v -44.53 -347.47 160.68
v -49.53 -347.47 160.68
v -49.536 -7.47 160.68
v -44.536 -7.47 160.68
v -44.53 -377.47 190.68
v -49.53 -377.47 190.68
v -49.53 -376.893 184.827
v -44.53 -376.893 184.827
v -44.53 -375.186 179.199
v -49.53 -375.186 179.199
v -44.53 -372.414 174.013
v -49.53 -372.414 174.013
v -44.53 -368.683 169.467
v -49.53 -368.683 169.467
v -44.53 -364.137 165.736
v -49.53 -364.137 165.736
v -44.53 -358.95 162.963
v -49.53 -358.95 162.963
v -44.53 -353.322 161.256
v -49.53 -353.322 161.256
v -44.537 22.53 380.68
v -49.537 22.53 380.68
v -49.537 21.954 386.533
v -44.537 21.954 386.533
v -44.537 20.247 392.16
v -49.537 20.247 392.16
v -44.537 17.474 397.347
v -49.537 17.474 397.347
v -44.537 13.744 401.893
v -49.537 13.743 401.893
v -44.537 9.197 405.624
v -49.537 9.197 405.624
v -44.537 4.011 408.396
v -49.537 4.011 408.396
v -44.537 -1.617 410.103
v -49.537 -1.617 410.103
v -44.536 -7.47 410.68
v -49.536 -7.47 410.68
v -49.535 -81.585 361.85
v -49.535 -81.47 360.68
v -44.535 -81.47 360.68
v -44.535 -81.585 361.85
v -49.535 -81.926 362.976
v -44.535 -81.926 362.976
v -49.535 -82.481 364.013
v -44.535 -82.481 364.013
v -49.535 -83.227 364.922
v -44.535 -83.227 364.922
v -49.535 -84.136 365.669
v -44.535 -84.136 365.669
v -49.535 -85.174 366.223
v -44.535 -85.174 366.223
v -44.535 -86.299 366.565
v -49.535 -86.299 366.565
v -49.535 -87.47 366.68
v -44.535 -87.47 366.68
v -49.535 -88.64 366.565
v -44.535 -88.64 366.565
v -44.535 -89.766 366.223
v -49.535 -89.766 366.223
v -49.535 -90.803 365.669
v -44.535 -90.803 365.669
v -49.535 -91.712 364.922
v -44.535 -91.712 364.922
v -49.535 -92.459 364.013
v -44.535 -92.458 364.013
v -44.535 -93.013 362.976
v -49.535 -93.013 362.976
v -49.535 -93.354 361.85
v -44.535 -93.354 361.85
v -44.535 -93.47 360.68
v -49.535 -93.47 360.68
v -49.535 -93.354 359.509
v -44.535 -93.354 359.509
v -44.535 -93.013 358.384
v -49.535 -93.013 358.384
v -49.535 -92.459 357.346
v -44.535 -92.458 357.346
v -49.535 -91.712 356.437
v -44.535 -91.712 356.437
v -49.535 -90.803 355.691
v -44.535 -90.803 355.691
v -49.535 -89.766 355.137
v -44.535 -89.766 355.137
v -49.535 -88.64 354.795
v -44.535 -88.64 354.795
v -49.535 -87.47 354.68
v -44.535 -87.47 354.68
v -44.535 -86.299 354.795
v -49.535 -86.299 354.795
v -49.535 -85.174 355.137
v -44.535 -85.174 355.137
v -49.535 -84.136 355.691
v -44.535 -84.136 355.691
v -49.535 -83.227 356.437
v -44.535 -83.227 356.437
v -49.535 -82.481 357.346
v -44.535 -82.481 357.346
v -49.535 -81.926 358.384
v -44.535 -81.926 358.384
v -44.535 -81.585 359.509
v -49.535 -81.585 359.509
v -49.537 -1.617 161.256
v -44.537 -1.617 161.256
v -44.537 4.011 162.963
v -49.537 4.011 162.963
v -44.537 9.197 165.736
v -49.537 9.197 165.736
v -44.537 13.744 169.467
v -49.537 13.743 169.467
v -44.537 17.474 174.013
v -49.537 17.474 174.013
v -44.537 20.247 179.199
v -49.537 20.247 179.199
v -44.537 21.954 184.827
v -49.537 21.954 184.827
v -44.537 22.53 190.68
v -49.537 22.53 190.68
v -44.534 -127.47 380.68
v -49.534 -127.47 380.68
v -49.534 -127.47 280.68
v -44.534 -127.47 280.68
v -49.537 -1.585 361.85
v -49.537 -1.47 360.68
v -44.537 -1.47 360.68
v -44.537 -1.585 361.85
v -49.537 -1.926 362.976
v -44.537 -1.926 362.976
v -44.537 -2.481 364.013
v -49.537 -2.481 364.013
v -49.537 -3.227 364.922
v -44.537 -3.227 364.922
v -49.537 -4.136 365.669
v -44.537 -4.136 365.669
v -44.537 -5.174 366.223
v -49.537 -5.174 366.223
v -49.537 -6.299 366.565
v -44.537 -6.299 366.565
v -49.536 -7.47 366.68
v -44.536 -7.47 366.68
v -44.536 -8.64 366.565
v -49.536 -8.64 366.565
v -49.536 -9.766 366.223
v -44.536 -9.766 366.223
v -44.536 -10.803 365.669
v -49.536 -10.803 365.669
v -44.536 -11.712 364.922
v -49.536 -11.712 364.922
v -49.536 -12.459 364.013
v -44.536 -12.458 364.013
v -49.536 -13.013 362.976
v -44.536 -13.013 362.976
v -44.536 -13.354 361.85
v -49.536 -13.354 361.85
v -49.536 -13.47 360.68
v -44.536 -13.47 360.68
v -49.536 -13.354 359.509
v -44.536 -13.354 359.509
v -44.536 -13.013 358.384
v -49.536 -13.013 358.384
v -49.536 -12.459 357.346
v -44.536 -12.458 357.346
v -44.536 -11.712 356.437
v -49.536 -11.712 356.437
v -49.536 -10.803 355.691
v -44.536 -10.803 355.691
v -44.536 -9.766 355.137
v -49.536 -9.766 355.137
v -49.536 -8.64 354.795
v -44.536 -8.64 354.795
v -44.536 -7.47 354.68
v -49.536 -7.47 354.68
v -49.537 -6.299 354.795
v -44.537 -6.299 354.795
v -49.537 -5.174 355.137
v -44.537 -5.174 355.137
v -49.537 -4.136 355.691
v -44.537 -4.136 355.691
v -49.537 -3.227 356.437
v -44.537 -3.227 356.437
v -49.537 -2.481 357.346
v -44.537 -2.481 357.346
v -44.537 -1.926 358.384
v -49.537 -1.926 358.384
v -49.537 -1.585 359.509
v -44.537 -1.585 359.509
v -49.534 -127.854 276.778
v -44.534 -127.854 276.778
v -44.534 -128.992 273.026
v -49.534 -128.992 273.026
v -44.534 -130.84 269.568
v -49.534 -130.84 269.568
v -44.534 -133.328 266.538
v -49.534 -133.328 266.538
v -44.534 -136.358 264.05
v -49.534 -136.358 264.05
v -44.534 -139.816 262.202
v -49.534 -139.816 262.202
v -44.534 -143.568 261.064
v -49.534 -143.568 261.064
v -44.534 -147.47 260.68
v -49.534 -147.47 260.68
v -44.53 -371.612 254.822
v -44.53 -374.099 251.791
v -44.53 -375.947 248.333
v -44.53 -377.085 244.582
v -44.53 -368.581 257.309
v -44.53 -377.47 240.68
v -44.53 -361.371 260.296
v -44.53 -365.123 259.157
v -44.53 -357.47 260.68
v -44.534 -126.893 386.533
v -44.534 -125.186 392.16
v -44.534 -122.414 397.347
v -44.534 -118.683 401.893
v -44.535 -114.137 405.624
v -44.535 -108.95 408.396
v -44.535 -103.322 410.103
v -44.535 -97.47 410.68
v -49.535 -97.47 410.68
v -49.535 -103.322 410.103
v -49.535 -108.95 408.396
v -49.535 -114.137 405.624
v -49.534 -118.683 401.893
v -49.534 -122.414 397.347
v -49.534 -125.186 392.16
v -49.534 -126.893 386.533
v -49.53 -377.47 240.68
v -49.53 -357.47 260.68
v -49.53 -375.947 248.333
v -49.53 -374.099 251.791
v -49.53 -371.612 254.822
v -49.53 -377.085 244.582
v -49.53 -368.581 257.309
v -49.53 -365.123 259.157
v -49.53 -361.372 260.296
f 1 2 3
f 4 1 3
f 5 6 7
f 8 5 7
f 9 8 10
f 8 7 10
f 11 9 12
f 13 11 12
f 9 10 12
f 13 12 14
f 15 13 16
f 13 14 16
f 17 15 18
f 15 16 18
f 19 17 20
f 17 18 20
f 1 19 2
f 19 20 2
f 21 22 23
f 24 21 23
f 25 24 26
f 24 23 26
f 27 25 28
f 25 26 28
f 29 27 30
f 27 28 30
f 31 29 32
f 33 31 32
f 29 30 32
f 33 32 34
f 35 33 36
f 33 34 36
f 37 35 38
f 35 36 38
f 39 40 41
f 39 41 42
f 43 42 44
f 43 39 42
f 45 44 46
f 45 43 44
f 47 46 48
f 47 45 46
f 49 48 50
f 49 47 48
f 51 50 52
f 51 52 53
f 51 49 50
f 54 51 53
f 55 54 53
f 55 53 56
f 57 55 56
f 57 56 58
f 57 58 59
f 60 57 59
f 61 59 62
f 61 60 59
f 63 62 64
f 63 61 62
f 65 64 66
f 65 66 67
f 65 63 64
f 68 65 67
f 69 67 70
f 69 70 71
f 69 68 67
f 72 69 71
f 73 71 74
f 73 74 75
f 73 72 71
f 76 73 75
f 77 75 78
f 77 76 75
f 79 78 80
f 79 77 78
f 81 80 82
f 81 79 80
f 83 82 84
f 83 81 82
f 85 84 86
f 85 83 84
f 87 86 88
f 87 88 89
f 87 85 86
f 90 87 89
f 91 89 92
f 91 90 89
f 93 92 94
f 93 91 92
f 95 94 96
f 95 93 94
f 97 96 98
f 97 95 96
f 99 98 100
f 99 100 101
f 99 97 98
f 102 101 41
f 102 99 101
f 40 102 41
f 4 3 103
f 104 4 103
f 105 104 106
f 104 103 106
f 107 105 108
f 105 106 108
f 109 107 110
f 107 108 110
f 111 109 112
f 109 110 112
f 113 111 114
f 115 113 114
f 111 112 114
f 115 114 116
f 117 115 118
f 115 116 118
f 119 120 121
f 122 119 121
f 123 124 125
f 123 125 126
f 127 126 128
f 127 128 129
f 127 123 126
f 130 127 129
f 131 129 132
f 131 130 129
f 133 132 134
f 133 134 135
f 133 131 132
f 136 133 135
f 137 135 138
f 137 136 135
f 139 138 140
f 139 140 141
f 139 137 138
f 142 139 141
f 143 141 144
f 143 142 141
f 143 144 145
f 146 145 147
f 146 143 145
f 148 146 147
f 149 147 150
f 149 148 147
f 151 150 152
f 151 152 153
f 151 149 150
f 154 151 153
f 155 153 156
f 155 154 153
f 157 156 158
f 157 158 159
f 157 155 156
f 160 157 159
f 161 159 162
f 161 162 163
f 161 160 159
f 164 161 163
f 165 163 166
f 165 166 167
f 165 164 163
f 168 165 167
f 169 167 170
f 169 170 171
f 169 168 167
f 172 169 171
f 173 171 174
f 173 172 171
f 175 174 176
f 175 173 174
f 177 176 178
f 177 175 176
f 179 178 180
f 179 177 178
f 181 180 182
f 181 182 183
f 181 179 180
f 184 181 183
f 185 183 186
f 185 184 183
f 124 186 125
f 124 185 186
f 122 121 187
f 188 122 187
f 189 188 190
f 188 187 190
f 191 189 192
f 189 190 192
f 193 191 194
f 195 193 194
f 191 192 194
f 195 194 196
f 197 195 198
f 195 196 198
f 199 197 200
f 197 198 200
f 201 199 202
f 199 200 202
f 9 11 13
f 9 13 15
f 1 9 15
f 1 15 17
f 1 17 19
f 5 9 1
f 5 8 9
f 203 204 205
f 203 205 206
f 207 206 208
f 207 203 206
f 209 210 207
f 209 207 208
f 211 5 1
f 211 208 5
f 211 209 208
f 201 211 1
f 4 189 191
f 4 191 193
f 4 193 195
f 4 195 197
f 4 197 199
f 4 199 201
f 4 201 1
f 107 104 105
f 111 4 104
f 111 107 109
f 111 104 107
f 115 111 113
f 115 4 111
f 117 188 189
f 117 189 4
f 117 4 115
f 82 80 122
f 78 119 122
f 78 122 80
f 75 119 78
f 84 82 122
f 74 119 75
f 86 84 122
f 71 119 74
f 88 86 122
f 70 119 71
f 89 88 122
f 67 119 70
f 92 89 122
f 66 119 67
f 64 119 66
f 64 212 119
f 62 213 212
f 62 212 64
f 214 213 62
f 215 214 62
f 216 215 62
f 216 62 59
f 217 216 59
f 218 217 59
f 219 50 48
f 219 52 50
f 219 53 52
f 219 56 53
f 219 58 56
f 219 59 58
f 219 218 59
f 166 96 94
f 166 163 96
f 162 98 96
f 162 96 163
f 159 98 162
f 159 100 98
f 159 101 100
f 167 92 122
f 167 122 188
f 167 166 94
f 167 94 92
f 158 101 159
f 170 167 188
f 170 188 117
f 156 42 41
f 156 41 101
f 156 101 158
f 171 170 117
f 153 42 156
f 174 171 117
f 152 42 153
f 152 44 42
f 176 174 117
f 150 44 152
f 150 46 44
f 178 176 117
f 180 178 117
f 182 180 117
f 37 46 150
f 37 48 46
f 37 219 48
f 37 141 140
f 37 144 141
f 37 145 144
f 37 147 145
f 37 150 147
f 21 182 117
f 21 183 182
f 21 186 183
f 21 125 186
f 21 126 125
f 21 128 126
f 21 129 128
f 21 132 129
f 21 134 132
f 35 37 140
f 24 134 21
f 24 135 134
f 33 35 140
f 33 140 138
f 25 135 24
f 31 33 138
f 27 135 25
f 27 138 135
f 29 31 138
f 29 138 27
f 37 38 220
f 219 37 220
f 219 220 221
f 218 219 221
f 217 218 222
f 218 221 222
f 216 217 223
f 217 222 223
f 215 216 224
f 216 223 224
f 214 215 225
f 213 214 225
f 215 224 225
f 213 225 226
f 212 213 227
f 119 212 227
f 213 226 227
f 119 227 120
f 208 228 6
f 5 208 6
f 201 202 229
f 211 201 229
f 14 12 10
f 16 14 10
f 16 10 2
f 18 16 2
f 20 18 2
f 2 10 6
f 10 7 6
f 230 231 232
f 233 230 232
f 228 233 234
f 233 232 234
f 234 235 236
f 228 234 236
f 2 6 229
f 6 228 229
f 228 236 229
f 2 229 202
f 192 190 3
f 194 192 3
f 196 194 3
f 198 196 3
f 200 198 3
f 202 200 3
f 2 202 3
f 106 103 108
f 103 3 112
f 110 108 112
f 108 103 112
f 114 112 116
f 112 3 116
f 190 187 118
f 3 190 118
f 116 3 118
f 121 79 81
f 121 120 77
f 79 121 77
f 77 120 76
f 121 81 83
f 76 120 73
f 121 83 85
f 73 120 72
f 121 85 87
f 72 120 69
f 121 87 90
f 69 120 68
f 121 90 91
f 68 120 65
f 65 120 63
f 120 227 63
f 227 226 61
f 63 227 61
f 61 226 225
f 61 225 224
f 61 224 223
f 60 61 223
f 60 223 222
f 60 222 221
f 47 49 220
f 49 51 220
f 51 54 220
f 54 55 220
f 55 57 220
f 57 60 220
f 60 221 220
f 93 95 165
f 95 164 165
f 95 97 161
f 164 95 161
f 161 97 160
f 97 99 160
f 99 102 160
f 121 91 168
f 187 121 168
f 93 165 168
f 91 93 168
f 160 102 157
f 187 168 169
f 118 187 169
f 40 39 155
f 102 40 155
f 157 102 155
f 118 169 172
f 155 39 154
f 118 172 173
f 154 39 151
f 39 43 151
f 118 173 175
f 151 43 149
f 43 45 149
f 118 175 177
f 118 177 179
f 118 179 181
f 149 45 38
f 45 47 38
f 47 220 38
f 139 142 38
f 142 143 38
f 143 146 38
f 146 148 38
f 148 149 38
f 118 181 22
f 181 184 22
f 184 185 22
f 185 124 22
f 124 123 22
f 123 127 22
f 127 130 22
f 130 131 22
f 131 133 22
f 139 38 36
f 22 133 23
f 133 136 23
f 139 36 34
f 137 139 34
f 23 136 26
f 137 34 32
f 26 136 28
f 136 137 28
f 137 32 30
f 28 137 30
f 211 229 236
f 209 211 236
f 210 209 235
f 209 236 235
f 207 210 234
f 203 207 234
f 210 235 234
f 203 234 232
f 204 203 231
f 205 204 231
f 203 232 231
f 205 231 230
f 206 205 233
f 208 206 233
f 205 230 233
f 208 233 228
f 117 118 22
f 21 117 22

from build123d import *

# Parameters (mm, degrees)
F1_DEPTH = 120
F2_R     = 6
F3_DEPTH = 5
F4_R     = 6
F5_DEPTH = 5


with BuildPart() as f1:
    # F0 (on Top) → F1 (new body)
    with BuildSketch(Plane.XY):
        with BuildLine():
            Line((120.464271, 36.765282), (-39.183099, 36.765282))
            ThreePointArc((-39.183099, 36.765282), (-50.372007, 32.173501), (-54.535729, 20.818346))
            Line((-54.535729, 20.818346), (-54.535729, -83.234718))
            Line((-54.535729, -83.234718), (-49.535177, -83.234718))
            Line((-49.535177, -83.234718), (-49.536819, 10.563834))
            Line((-49.536819, 10.563834), (-49.537028, 22.530258))
            ThreePointArc((-49.537028, 22.530258), (-46.279821, 29.181243), (-39.340395, 31.767623))
            Line((-39.340395, 31.767623), (-28.383342, 31.767623))
            Line((-28.383342, 31.767623), (120.464271, 31.767623))
            Line((120.464271, 31.767623), (120.464271, 36.765282))
        make_face()
    extrude(amount=F1_DEPTH)

    # F2 (on face) → F3 (cut)
    with BuildSketch(Plane(origin=(0, 36.765282, 0), x_dir=(-1, 0, 0), z_dir=(0, 1, 0))):
        with Locations((-70.464271, 60)):
            Circle(F2_R)
        with Locations((-20.464271, 60)):
            Circle(F2_R)
    extrude(amount=-F3_DEPTH, mode=Mode.SUBTRACT)


with BuildPart() as f5:
    # F4 (on face) → F5 (new body)
    with BuildSketch(Plane(origin=(-49.536634, -0.000867, 0), x_dir=(-1.8e-05, 1, 0), z_dir=(1, 1.8e-05, 0))):
        with BuildLine():
            Line((-347.468874, 160.679807), (-7.468874, 160.679807))
            ThreePointArc((-7.468874, 160.679807), (13.744329, 169.466604), (22.531126, 190.679807))
            Line((22.531126, 190.679807), (22.531126, 380.679807))
            ThreePointArc((22.531126, 380.679807), (13.744329, 401.893011), (-7.468874, 410.679807))
            Line((-7.468874, 410.679807), (-97.468874, 410.679807))
            ThreePointArc((-97.468874, 410.679807), (-118.682078, 401.893011), (-127.468874, 380.679807))
            Line((-127.468874, 380.679807), (-127.468874, 280.679807))
            ThreePointArc((-127.468874, 280.679807), (-133.326739, 266.537672), (-147.468874, 260.679807))
            Line((-147.468874, 260.679807), (-357.468874, 260.679807))
            ThreePointArc((-357.468874, 260.679807), (-371.61101, 254.821943), (-377.468874, 240.679807))
            Line((-377.468874, 240.679807), (-377.468874, 190.679807))
            ThreePointArc((-377.468874, 190.679807), (-368.682078, 169.466604), (-347.468874, 160.679807))
        make_face()
        with Locations((-87.468874, 360.679807)):
            Circle(F4_R, mode=Mode.SUBTRACT)
        with Locations((-7.468874, 360.679807)):
            Circle(F4_R, mode=Mode.SUBTRACT)
    extrude(amount=F5_DEPTH)


solid = f5.part
